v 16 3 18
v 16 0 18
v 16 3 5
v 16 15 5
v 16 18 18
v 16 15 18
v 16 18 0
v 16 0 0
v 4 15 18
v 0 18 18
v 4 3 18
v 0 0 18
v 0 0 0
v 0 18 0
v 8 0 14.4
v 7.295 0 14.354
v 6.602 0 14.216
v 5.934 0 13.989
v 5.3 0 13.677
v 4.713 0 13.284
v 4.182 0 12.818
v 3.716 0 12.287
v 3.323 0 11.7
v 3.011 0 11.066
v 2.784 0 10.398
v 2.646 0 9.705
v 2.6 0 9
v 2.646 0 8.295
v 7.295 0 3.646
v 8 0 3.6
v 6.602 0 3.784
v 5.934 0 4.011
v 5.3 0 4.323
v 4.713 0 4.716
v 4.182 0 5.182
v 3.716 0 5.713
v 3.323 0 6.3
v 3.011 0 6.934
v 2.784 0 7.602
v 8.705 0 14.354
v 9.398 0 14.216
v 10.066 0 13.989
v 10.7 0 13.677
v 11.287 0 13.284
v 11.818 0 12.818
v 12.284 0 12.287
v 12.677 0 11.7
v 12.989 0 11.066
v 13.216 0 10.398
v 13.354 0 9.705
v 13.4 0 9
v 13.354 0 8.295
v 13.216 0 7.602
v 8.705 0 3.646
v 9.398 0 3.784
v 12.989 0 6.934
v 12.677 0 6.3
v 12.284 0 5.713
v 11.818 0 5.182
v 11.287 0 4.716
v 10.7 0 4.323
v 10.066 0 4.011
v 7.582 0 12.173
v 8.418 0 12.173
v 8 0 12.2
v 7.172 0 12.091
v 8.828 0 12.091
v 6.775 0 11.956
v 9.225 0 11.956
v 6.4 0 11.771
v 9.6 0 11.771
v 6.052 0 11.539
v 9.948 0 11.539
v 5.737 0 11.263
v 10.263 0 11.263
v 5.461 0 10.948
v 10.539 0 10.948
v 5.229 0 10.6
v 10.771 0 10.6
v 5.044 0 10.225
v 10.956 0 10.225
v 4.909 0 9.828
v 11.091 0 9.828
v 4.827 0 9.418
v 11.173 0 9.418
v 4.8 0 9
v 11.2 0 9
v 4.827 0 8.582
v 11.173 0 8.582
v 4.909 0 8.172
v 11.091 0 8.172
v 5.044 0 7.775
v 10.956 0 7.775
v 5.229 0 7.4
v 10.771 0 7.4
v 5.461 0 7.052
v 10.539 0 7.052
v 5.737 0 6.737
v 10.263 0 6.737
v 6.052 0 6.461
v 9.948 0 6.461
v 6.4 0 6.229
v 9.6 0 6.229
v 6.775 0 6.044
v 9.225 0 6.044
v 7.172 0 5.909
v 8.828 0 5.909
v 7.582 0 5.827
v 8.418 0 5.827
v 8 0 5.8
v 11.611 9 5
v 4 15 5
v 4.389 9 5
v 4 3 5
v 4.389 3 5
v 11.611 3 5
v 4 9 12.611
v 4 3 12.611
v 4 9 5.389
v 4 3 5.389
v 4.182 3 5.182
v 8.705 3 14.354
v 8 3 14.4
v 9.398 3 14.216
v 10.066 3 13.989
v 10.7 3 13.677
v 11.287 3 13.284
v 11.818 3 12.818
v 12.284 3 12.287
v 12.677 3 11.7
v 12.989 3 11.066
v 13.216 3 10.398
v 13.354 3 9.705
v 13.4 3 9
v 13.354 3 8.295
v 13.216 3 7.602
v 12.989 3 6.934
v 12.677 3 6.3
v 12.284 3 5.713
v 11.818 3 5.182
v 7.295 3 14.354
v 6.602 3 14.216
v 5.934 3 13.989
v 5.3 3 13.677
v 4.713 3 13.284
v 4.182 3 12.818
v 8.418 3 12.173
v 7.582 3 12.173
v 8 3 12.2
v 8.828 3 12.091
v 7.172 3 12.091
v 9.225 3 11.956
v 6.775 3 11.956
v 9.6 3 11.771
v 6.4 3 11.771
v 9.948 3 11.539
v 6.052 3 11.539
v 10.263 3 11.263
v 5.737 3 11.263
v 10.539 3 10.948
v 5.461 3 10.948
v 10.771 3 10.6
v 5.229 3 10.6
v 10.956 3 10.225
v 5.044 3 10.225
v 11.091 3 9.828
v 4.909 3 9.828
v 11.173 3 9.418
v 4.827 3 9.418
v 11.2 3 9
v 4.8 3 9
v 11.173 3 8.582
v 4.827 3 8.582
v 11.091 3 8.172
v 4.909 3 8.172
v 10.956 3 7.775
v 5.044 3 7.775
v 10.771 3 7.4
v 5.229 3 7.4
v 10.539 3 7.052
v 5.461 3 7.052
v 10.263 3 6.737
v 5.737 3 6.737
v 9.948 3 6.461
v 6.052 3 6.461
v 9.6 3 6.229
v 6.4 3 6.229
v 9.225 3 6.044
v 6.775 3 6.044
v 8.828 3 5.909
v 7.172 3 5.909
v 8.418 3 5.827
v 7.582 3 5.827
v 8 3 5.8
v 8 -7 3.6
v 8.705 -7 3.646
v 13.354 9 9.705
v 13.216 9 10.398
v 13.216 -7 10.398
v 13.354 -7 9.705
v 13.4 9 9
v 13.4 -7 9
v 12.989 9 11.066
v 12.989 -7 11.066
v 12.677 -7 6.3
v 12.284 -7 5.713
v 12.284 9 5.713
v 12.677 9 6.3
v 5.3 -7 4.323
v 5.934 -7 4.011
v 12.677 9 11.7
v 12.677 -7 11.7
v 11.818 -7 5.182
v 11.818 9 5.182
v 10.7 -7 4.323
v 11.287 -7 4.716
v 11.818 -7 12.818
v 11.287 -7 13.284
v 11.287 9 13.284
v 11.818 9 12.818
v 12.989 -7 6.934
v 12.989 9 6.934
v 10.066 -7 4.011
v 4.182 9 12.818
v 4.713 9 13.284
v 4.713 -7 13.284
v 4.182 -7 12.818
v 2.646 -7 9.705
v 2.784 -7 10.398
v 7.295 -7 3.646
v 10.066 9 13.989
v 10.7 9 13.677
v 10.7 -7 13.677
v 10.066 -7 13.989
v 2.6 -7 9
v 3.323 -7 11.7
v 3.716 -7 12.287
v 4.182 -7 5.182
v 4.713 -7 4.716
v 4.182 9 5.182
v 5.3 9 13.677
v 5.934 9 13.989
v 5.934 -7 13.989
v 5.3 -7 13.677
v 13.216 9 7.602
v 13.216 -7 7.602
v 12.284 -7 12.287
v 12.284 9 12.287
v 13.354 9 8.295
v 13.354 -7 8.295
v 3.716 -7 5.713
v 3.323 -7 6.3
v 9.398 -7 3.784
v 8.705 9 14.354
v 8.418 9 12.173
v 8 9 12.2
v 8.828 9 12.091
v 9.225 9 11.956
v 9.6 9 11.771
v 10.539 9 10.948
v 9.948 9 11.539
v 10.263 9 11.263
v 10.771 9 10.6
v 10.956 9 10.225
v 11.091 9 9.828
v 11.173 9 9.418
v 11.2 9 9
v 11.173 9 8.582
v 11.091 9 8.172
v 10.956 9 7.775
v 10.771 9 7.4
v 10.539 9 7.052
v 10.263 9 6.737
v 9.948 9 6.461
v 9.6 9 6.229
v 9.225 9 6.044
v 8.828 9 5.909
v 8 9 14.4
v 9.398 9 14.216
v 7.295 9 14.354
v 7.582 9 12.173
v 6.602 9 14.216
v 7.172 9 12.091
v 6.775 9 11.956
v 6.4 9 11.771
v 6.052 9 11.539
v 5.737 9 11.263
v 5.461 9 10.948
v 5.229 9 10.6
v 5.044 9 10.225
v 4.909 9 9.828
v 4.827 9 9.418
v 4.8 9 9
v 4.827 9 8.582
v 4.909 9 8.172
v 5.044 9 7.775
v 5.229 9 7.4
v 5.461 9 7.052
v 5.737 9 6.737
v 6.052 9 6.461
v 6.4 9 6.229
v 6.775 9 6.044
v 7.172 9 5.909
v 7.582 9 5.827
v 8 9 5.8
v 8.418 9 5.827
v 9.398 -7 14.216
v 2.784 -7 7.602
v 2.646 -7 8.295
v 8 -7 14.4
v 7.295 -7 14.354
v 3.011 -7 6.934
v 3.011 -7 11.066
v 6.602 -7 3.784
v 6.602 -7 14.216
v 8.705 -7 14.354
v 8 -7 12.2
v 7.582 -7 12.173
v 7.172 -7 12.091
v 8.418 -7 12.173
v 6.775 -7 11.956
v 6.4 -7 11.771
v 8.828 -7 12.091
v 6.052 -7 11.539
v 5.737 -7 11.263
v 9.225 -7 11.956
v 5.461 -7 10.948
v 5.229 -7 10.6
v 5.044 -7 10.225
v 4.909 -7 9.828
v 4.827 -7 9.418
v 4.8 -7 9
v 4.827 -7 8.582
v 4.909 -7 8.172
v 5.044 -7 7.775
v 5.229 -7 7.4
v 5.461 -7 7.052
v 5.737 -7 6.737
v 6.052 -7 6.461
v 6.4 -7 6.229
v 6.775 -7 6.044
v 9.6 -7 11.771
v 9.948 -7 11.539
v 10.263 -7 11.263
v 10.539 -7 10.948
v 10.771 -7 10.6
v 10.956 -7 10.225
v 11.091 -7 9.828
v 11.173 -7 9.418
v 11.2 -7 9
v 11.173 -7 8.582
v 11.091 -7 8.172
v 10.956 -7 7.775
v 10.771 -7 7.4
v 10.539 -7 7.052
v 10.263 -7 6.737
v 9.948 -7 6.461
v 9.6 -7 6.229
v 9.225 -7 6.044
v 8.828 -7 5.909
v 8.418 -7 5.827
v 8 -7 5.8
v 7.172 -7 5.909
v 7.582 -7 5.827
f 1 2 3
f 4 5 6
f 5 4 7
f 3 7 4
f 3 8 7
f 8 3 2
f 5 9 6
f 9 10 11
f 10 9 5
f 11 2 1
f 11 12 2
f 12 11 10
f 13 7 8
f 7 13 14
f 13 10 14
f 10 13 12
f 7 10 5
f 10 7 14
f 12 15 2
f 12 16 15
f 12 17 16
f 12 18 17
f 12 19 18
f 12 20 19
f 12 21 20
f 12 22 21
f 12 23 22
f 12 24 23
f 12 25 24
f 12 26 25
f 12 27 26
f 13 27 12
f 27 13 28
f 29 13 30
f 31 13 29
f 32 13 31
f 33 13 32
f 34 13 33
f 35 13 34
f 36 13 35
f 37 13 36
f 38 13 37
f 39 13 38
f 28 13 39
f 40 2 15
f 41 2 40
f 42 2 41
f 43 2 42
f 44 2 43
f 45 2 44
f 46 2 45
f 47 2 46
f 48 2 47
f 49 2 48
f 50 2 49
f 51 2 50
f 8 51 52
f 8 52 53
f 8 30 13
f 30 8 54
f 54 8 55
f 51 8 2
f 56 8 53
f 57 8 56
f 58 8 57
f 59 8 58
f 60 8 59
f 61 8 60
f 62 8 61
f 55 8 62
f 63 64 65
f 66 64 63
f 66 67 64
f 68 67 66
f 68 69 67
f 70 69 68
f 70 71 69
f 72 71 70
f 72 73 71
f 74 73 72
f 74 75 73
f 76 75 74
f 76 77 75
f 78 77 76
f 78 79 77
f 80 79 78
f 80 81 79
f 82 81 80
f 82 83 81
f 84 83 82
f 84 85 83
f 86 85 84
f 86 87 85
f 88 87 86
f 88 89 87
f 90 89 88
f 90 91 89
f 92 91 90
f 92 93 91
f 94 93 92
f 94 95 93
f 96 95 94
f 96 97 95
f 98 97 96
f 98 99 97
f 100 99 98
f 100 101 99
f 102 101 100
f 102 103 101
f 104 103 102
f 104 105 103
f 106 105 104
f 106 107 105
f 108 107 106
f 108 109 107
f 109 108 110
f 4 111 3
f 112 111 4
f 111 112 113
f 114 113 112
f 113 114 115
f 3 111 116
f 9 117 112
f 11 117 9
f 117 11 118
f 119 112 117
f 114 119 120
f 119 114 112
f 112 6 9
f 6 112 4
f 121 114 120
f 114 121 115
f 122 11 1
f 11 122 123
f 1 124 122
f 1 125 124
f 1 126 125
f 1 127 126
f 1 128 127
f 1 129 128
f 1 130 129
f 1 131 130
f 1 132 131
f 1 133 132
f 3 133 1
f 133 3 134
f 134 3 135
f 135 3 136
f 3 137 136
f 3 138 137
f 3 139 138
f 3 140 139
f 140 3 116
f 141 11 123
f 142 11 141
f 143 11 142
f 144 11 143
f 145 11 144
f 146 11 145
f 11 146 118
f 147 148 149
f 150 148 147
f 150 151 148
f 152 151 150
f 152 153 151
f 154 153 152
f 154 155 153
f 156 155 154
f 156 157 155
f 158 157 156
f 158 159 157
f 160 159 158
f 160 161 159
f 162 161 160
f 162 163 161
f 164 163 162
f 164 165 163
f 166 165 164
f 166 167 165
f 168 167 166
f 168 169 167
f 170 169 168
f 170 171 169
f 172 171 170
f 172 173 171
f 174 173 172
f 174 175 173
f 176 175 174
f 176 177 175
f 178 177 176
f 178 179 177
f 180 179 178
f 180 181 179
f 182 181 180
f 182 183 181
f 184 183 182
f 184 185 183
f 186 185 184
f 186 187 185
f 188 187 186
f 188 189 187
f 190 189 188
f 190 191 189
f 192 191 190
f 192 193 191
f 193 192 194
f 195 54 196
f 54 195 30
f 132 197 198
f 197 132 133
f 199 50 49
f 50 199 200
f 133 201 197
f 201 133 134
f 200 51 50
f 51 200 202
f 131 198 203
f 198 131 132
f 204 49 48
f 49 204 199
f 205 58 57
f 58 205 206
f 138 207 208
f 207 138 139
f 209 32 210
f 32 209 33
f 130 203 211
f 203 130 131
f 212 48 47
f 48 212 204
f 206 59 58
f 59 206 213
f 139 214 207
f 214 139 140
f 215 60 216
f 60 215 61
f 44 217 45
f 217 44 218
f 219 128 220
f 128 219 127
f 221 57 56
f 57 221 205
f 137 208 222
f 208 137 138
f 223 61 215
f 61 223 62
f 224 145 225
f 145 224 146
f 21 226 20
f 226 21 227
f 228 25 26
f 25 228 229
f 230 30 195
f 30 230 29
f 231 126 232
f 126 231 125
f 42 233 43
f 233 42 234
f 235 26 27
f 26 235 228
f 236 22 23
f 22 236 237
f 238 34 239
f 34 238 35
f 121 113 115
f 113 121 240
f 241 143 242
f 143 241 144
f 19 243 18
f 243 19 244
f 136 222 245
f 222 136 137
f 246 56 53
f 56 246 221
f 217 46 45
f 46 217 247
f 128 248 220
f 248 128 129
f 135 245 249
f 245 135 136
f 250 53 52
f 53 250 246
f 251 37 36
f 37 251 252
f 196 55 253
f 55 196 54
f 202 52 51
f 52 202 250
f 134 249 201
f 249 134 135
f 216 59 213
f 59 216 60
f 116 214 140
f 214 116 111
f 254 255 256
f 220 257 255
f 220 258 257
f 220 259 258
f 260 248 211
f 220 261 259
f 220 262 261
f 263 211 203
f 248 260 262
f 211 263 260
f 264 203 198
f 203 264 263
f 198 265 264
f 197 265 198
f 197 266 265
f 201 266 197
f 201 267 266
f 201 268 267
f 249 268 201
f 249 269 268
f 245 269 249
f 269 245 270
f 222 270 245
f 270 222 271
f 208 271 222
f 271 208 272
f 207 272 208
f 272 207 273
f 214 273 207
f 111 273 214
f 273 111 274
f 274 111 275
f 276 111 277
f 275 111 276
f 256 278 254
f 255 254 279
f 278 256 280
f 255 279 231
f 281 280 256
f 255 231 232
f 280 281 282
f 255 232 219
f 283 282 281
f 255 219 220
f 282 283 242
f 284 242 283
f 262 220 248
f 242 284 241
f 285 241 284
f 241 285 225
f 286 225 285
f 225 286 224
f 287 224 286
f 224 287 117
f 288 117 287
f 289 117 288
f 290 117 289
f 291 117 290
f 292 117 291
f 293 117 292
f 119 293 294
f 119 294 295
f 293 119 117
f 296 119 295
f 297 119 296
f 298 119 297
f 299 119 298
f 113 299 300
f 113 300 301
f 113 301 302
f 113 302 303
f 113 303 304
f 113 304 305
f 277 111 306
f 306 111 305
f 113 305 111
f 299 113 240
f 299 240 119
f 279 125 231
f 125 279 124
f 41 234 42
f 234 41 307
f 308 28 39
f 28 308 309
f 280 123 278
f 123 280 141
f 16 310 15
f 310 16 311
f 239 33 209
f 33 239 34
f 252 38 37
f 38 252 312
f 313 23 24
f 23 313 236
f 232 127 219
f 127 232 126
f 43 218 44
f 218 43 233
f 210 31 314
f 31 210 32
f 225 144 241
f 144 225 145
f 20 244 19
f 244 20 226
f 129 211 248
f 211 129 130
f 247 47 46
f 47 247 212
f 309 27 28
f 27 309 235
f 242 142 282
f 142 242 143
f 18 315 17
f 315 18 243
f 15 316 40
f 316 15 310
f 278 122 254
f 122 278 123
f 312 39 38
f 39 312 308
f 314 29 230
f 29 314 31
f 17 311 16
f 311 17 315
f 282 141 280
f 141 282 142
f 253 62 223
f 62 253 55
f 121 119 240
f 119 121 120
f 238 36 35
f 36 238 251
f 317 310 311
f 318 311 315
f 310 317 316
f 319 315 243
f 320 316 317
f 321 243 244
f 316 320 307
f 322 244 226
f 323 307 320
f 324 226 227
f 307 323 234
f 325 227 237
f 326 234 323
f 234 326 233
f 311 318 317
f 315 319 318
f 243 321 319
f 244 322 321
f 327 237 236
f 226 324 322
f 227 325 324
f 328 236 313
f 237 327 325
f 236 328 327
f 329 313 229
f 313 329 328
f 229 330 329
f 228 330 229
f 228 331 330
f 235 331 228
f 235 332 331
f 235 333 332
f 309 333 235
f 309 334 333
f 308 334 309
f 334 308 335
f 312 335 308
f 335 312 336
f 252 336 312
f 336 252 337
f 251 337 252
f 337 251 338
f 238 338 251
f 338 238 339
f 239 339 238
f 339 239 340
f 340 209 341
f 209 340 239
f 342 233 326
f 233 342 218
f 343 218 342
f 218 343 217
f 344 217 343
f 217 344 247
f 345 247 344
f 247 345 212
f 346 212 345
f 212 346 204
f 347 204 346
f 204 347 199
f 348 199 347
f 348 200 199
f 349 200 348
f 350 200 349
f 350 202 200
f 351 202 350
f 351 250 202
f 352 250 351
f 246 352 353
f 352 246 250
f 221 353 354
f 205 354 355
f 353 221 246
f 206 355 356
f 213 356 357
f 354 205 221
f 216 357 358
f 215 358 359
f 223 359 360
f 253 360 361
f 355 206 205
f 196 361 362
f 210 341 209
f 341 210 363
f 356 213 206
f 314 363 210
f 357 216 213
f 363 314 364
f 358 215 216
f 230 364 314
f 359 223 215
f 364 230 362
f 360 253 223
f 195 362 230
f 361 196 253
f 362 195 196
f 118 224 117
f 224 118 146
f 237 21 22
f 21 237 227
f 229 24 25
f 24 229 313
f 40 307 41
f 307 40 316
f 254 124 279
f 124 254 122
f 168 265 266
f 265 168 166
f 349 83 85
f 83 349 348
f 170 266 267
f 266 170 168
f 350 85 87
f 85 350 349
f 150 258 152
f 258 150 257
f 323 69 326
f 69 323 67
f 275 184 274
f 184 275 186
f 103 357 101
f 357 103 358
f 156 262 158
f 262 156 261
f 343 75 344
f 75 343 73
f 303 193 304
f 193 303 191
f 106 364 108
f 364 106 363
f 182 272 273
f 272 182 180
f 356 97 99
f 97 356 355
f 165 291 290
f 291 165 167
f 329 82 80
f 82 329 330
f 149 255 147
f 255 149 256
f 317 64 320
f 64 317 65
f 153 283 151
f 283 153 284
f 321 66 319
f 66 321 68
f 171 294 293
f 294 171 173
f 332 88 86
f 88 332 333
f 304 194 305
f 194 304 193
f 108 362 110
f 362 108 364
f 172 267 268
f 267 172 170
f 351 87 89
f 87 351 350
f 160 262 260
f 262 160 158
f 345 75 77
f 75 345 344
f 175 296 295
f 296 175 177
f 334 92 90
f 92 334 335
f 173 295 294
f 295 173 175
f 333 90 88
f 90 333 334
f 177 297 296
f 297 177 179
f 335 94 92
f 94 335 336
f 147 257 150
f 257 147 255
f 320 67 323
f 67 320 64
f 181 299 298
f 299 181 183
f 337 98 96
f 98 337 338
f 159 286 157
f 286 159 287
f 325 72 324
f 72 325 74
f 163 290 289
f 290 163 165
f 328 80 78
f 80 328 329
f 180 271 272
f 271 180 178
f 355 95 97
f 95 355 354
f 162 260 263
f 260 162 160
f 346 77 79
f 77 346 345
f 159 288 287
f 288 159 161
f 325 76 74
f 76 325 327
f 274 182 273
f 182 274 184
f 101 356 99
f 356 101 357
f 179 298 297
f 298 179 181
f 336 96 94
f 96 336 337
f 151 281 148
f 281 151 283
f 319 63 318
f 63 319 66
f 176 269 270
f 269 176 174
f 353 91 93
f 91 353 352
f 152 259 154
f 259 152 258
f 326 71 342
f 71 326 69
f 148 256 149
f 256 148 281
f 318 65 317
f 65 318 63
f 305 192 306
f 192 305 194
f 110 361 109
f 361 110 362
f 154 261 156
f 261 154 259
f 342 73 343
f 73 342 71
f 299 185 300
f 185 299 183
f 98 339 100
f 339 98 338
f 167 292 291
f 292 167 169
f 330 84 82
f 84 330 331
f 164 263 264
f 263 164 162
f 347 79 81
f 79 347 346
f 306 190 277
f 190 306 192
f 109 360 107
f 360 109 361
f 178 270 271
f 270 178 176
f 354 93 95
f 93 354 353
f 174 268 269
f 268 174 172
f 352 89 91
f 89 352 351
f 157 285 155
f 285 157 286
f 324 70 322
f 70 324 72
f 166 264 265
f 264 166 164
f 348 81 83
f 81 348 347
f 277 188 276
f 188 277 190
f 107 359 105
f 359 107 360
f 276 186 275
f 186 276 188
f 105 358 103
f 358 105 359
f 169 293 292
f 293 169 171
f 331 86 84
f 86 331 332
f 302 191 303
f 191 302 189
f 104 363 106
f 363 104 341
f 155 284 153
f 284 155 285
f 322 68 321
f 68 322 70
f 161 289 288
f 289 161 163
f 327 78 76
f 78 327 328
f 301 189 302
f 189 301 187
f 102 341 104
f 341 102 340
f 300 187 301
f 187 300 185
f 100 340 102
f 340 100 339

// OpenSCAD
// file: ../params/mvp_params.scad
// ===================================
// OpenGarden MVP Parameters
// Carrier + Insert architecture
// ===================================

// ---------- Pot Insert ----------
insert_top_width        = 156;
insert_top_depth        = 156;
insert_bottom_width     = 138;
insert_bottom_depth     = 138;
insert_height           = 145;

insert_wall_thickness   = 2.4;
insert_bottom_thickness = 3.0;

// Top seating flange
insert_flange_width     = 6;
insert_flange_thickness = 3;

// Drainage
drain_hole_diameter     = 8;
drain_hole_offset_x     = 28;
drain_hole_offset_y     = 0;

// Carrier
carrier_outer_width     = 176;
carrier_outer_depth     = 176;
carrier_height          = 160;

carrier_wall_thickness  = 4;
carrier_back_thickness  = 5;
carrier_ledge_width     = 8;
carrier_ledge_height    = 12;

// Sensor
sensor_probe_width      = 14;
sensor_probe_thickness  = 6;
sensor_probe_length     = 70;

sensor_holder_width     = 22;
sensor_holder_thickness = 3;
sensor_holder_height    = 28;
sensor_insert_depth     = 60;

// Tube
tube_outer_diameter     = 6.0;
tube_clip_wall          = 2.4;
tube_clip_width         = 16;
tube_drop_inset         = 18;

// Electronics
electronics_plate_width  = 110;
electronics_plate_height = 140;
electronics_plate_thick  = 4;

// General print
clearance_loose         = 0.4;
clearance_tight         = 0.2;
$fn = 48;
// main file
include <../params/mvp_params.scad>

// ===================================
// Tube Clip
// Clip-on insert flange holder
// ===================================

module clip_body() {
    difference() {
        cube([16, 18, 18], center = false);

        translate([4, 3, 5])
            cube([14, 12, 16], center = false);
    }
}

module tube_ring() {
    difference() {
        cylinder(d = tube_outer_diameter + 2 * tube_clip_wall, h = tube_clip_width);
        translate([0, 0, -0.5])
            cylinder(d = tube_outer_diameter + clearance_loose, h = tube_clip_width + 1);
    }
}

module tube_clip() {
    union() {
        clip_body();

        translate([8, 9, 9])
        rotate([90, 0, 0])
        tube_ring();
    }
}

tube_clip();
